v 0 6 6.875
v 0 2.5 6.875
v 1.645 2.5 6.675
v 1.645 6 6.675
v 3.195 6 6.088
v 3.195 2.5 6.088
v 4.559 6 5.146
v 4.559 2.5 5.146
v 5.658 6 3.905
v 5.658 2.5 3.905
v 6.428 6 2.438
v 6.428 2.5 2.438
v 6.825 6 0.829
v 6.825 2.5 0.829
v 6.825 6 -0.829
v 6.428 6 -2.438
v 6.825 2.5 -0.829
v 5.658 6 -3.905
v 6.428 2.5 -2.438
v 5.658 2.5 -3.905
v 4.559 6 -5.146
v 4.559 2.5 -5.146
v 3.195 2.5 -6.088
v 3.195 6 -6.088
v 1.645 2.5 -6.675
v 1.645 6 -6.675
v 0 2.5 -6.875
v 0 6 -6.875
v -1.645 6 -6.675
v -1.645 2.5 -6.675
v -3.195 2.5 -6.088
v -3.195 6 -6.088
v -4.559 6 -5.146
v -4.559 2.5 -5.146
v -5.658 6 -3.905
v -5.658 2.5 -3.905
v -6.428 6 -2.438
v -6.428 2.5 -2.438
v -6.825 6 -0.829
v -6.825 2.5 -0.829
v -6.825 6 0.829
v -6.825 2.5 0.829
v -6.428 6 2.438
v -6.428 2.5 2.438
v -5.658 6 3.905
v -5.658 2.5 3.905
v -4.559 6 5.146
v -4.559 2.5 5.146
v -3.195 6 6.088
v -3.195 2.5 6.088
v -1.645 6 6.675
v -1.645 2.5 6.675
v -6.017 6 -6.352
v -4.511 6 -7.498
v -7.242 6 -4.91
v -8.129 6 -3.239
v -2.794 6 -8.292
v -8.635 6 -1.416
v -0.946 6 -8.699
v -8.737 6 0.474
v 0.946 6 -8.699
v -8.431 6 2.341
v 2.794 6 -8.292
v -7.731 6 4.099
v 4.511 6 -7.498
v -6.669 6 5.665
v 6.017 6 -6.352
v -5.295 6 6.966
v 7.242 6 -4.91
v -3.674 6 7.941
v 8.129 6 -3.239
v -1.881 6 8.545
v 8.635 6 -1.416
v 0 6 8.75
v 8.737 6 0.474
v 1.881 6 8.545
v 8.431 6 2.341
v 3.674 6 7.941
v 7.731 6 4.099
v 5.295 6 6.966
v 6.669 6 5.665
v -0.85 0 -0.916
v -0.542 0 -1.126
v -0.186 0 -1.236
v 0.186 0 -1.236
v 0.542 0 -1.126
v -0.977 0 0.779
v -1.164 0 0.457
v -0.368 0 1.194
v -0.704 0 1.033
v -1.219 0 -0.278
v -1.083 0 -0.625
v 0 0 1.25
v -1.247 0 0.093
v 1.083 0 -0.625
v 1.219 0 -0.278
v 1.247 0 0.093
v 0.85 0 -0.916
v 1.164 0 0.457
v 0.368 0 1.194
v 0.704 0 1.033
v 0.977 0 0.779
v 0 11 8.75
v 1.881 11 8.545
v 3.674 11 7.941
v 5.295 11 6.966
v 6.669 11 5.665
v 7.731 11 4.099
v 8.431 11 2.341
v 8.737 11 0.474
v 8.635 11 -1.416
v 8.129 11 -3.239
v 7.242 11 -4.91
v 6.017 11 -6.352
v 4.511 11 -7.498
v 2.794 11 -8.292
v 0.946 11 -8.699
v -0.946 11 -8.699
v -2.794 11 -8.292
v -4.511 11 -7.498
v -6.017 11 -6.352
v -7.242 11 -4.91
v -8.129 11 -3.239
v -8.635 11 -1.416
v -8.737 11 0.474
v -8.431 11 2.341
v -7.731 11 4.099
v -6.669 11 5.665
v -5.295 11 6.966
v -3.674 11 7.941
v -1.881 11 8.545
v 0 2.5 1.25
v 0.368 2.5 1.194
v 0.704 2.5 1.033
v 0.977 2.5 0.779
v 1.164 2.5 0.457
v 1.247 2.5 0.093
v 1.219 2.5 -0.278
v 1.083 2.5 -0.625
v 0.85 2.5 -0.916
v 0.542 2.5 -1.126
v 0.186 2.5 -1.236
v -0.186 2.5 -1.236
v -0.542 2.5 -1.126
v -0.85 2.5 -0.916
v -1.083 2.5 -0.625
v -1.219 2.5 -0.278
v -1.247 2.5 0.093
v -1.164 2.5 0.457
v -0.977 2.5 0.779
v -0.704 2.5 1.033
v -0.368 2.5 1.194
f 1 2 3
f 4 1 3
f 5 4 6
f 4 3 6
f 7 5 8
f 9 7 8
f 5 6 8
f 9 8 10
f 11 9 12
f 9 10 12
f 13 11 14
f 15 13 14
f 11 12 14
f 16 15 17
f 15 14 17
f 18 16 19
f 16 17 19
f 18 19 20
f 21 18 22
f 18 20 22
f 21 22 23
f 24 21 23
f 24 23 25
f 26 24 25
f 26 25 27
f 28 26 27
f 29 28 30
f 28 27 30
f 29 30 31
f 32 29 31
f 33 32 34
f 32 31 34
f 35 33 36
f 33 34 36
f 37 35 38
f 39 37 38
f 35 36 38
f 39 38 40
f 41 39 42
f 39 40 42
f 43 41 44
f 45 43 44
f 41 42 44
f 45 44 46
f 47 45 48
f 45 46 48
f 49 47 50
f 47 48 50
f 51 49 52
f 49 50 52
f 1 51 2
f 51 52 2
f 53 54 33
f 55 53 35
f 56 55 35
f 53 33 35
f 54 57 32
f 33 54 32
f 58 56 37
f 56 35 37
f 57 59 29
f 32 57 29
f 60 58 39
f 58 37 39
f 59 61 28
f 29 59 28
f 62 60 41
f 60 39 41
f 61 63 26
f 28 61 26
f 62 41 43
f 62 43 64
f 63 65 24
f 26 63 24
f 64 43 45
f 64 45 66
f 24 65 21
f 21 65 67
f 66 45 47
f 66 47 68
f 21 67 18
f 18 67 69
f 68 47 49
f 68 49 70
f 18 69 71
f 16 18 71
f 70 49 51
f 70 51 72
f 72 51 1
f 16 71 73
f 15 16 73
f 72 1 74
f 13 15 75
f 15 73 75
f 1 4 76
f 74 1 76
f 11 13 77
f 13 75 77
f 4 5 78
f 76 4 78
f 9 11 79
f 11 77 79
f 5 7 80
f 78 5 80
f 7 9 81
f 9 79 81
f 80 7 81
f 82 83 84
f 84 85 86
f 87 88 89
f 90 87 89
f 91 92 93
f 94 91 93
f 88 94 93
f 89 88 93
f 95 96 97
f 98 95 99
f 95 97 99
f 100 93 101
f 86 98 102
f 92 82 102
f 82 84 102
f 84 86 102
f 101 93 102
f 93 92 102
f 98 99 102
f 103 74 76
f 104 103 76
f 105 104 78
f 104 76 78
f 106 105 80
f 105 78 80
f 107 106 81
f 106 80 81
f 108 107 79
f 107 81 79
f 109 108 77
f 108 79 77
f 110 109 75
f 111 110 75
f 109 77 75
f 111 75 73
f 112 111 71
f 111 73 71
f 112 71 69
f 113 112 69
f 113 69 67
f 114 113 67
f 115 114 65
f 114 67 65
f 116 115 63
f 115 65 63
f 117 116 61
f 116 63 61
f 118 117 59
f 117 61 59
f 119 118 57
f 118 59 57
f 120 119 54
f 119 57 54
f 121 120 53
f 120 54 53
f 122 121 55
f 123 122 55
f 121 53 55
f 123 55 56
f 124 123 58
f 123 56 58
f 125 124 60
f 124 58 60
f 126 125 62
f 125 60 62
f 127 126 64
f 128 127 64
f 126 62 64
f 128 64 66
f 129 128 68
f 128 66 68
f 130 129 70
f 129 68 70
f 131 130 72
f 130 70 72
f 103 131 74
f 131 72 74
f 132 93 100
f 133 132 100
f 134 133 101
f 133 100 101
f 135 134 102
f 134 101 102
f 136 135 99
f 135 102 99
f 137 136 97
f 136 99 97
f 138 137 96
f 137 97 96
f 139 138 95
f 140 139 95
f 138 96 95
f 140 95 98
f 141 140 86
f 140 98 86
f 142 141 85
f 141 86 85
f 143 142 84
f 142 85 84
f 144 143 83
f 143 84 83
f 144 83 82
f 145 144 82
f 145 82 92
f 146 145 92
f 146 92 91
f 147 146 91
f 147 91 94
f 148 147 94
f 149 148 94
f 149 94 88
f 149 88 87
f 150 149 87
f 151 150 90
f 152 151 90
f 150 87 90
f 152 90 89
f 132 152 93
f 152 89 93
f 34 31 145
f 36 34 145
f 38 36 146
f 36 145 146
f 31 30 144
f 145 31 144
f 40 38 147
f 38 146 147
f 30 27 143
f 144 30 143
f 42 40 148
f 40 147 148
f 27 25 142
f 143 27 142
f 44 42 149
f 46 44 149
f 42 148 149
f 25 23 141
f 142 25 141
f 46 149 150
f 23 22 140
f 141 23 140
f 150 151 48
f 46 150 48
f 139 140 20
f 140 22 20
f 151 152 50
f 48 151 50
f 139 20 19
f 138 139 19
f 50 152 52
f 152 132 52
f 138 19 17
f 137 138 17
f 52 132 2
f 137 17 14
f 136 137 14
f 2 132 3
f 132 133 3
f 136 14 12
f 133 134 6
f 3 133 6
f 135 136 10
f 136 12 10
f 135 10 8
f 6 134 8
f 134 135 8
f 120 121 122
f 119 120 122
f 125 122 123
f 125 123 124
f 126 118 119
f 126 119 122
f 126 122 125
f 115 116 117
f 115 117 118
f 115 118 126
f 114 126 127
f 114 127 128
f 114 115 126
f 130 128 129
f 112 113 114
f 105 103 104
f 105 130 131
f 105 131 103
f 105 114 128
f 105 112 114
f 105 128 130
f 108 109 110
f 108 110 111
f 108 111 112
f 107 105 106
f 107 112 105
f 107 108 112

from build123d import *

# Parameters (mm, degrees)
SKETCH1_R           = 1.25
BOSS_EXTRUDE1_DEPTH = 2.5
SKETCH2_R           = 6.875
BOSS_EXTRUDE2_DEPTH = 3.5
SKETCH3_R           = 8.75
BOSS_EXTRUDE3_DEPTH = 5


with BuildPart() as part:
    # Sketch1 → Boss-Extrude1 (new body)
    with BuildSketch(Plane(origin=(0, 0, 0), x_dir=(1, 0, 0), z_dir=(0, 1, 0))):
        with Locations(Location((0, 0, 0), (0, 0, 270))):
            Circle(SKETCH1_R)
    extrude(amount=BOSS_EXTRUDE1_DEPTH)

    # Sketch2 → Boss-Extrude2 (add)
    with BuildSketch(Plane(origin=(0, 2.5, 0), x_dir=(1, 0, 0), z_dir=(0, 1, 0))):
        with Locations(Location((0, 0, 0), (0, 0, 270))):
            Circle(SKETCH2_R)
    extrude(amount=BOSS_EXTRUDE2_DEPTH)

    # Sketch3 → Boss-Extrude3 (add)
    with BuildSketch(Plane(origin=(0, 6, 0), x_dir=(1, 0, 0), z_dir=(0, 1, 0))):
        with Locations(Location((0, 0, 0), (0, 0, 270))):
            Circle(SKETCH3_R)
    extrude(amount=BOSS_EXTRUDE3_DEPTH)


solid = part.part
